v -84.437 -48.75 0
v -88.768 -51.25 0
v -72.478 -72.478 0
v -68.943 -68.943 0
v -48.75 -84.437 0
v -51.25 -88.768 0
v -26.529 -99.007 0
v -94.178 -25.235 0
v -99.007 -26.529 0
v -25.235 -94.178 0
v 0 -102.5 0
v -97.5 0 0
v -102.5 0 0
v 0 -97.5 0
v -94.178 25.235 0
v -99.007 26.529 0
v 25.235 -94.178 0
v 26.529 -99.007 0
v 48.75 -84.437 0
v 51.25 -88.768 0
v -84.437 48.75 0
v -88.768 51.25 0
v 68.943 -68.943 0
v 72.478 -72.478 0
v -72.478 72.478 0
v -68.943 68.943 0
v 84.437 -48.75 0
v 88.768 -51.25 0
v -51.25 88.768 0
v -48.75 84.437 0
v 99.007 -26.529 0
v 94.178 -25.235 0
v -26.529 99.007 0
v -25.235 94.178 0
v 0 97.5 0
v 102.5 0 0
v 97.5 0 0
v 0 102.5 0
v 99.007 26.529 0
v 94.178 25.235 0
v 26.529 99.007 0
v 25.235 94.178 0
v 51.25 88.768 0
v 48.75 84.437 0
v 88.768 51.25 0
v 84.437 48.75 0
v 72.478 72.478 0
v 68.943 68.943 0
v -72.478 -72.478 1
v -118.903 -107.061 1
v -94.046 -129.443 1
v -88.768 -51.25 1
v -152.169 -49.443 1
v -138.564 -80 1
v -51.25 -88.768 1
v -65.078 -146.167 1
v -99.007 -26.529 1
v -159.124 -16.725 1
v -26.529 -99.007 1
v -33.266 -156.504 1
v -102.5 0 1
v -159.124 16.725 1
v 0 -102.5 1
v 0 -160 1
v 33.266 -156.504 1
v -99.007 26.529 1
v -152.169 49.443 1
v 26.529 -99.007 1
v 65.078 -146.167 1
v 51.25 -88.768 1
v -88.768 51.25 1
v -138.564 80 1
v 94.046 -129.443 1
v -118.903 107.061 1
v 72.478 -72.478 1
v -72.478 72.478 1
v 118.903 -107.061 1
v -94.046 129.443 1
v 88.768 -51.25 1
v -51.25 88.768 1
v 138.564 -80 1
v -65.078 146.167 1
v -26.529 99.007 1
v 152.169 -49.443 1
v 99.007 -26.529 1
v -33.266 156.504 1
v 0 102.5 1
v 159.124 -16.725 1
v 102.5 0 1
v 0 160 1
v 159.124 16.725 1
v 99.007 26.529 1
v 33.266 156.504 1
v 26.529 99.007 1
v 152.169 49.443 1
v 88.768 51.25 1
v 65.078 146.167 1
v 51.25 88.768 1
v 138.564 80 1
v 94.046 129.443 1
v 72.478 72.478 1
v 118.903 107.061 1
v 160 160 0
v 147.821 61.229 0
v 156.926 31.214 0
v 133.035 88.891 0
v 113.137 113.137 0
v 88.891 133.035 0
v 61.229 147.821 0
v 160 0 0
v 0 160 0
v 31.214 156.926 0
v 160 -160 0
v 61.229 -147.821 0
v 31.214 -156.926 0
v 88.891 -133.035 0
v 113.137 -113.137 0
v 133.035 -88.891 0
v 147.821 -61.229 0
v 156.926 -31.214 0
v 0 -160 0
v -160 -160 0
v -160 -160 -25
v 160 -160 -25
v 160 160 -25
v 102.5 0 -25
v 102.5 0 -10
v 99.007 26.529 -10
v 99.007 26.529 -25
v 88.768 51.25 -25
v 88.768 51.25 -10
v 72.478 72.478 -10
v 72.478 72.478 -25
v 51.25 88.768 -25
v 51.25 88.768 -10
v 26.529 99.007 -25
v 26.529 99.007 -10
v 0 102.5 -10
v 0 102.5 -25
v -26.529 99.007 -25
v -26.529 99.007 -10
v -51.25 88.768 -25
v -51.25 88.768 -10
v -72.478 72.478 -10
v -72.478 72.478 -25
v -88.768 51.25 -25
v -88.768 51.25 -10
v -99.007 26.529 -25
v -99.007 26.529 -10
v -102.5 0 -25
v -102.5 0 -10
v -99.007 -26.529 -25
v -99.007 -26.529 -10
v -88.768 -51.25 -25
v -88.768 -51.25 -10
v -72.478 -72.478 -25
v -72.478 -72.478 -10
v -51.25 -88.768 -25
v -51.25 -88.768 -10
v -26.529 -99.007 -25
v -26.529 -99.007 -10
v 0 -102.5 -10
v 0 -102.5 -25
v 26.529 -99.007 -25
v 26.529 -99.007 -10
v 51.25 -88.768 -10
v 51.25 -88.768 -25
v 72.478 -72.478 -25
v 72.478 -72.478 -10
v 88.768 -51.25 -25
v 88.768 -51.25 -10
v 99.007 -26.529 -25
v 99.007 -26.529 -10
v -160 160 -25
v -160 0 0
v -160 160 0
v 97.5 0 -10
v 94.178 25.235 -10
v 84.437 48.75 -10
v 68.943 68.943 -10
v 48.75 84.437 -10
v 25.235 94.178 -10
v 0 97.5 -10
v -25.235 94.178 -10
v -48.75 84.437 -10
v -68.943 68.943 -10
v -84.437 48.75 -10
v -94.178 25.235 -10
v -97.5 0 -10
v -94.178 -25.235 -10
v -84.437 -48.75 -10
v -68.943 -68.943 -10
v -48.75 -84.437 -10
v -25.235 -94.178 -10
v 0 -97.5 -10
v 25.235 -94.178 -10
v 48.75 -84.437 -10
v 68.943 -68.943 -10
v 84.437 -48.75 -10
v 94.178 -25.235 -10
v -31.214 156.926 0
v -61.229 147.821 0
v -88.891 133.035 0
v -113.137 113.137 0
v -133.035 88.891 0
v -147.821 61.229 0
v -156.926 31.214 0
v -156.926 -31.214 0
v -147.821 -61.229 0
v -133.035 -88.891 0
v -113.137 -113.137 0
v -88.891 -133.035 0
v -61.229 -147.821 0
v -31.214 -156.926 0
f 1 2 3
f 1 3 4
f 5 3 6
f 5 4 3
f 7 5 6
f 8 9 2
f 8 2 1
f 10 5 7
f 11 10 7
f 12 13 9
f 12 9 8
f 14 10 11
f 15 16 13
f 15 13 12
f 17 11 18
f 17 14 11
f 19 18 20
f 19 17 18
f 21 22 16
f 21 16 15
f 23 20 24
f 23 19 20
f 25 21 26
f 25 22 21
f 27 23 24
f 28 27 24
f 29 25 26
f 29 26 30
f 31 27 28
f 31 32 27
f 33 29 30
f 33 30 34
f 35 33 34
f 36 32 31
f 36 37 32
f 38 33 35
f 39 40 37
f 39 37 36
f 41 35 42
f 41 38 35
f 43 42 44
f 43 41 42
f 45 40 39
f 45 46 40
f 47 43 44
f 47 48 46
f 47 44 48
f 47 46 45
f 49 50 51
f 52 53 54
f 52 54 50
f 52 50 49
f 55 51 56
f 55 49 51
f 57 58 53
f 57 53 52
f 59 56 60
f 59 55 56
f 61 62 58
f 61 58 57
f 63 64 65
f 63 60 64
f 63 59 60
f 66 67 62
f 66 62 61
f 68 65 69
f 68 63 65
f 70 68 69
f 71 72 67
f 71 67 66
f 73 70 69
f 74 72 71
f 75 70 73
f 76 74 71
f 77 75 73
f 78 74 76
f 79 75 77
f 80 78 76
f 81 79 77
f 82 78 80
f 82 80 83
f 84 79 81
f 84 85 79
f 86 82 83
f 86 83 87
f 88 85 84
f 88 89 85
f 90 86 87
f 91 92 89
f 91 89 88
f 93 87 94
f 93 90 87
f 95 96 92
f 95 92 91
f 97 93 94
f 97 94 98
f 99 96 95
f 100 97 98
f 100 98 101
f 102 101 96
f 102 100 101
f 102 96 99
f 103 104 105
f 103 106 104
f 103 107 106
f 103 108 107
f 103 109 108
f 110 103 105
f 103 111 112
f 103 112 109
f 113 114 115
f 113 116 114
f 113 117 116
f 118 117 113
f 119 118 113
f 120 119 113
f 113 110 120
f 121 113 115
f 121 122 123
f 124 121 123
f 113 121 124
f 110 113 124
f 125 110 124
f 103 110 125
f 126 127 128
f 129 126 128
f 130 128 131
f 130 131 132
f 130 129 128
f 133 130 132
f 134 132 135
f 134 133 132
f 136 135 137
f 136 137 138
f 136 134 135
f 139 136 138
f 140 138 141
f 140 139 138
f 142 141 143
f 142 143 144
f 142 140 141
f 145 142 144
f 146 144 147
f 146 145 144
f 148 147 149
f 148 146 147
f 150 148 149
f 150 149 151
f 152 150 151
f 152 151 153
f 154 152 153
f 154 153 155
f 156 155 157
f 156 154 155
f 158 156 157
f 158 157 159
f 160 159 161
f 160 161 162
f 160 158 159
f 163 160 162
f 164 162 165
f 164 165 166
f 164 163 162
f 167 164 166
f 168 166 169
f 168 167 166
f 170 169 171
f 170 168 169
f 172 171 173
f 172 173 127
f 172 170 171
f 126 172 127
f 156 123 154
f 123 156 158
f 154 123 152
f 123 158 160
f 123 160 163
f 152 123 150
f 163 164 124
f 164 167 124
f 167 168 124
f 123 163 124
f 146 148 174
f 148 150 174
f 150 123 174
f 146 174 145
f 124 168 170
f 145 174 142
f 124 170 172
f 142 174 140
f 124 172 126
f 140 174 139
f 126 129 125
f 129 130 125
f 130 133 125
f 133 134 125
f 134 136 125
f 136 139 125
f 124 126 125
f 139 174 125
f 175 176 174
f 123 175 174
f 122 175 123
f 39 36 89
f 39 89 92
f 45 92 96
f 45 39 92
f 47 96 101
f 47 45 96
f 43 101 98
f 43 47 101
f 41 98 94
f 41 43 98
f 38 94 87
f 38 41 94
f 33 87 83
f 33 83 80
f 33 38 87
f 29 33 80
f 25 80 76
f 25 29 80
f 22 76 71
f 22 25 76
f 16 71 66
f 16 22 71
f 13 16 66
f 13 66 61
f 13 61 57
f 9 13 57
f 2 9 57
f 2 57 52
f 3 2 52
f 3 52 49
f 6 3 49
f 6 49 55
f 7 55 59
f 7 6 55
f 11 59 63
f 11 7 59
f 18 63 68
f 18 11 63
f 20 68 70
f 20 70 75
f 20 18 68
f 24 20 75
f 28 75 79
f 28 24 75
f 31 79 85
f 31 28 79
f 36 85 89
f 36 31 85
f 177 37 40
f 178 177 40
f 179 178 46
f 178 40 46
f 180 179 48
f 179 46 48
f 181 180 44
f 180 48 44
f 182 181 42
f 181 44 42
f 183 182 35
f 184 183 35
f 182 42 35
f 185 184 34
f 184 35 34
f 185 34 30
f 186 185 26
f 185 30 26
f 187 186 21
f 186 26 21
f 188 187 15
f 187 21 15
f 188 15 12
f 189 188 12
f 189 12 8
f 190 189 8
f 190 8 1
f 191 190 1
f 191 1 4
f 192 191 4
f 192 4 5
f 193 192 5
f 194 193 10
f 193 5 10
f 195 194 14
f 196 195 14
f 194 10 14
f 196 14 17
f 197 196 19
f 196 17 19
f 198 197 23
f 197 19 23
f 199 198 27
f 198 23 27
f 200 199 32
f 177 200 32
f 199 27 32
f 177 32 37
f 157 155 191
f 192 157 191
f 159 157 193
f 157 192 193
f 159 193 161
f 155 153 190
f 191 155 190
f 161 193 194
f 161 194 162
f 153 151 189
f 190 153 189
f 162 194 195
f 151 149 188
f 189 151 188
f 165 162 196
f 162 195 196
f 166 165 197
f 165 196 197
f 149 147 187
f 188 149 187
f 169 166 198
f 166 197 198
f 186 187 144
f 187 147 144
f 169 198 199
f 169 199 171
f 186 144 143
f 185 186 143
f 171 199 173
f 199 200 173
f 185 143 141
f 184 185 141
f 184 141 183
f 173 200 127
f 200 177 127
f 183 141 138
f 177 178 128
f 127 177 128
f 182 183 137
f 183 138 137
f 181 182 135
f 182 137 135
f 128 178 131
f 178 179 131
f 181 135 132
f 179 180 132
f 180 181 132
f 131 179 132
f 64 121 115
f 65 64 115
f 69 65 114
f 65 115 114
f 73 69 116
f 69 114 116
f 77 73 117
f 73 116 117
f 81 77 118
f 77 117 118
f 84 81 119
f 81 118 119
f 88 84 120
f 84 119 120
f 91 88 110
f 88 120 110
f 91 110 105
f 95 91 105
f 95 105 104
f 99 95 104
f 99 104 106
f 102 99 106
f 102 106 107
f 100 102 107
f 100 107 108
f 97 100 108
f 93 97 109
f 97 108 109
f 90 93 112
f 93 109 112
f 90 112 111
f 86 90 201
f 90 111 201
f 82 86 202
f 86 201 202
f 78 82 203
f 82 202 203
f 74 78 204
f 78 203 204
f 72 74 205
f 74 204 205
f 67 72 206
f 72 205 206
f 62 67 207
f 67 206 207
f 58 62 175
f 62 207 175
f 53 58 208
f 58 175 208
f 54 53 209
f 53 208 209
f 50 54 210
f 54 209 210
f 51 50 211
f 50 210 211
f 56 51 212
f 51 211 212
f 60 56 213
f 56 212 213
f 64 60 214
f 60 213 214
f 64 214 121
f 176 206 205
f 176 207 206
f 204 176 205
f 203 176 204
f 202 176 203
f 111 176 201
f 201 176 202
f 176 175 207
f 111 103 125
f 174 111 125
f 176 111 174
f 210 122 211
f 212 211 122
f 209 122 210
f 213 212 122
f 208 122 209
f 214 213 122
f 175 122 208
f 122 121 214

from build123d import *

# Parameters (mm, degrees)
F0_R     = 102.5
F1_DEPTH = 25
F2_DEPTH = 1
F3_DEPTH = 25
F4_R     = 102.5
F4_R_2   = 97.5
F5_DEPTH = 10


with BuildPart() as f1:
    # F0 (on Top) → F1 (new body)
    with BuildSketch(Plane.XY):
        with BuildLine():
            Line((160, 160), (2.52e-08, 160))
            ThreePointArc((2.52e-08, 160), (113.1370849988, 113.1370849809), (160, 0))
            Line((160, 0), (160, 160))
        make_face()
        with BuildLine():
            ThreePointArc((160, 0), (113.1370849988, 113.1370849809), (2.52e-08, 160))
            ThreePointArc((2.52e-08, 160), (-113.13708472, 113.1370852597), (-160, 7.381e-07))
            ThreePointArc((-160, 7.381e-07), (-113.1370852131, -113.1370847666), (1.067e-07, -160))
            ThreePointArc((1.067e-07, -160), (113.1370850276, -113.1370849521), (160, 0))
        make_face()
        Circle(F0_R, mode=Mode.SUBTRACT)
        with BuildLine():
            Line((160, -160), (160, 0))
            ThreePointArc((160, 0), (113.1370850276, -113.1370849521), (1.067e-07, -160))
            Line((1.067e-07, -160), (160, -160))
        make_face()
        Circle(F0_R)
        with BuildLine():
            Line((2.52e-08, 160), (-160, 160))
            Line((-160, 160), (-160, 7.381e-07))
            ThreePointArc((-160, 7.381e-07), (-113.13708472, 113.1370852597), (2.52e-08, 160))
        make_face()
        with BuildLine():
            ThreePointArc((1.067e-07, -160), (-113.1370852131, -113.1370847666), (-160, 7.381e-07))
            Line((-160, 7.381e-07), (-160, -160))
            Line((-160, -160), (1.067e-07, -160))
        make_face()
    extrude(amount=-F1_DEPTH)

    # F0 (on Top) → F2 (join)
    with BuildSketch(Plane.XY):
        with BuildLine():
            ThreePointArc((160, 0), (113.1370849988, 113.1370849809), (2.52e-08, 160))
            ThreePointArc((2.52e-08, 160), (-113.13708472, 113.1370852597), (-160, 7.381e-07))
            ThreePointArc((-160, 7.381e-07), (-113.1370852131, -113.1370847666), (1.067e-07, -160))
            ThreePointArc((1.067e-07, -160), (113.1370850276, -113.1370849521), (160, 0))
        make_face()
        Circle(F0_R, mode=Mode.SUBTRACT)
    extrude(amount=F2_DEPTH)

    # F3 (cut): a face of the model
    f3_faces = [f1.faces().sort_by_distance(p)[0] for p in [
        (0, 0, 0),
    ]]
    extrude(f3_faces, amount=-F3_DEPTH, mode=Mode.SUBTRACT)

    # F4 (on Top) → F5 (join)
    with BuildSketch(Plane.XY):
        Circle(F4_R)
        Circle(F4_R_2, mode=Mode.SUBTRACT)
    extrude(amount=-F5_DEPTH)


solid = f1.part
